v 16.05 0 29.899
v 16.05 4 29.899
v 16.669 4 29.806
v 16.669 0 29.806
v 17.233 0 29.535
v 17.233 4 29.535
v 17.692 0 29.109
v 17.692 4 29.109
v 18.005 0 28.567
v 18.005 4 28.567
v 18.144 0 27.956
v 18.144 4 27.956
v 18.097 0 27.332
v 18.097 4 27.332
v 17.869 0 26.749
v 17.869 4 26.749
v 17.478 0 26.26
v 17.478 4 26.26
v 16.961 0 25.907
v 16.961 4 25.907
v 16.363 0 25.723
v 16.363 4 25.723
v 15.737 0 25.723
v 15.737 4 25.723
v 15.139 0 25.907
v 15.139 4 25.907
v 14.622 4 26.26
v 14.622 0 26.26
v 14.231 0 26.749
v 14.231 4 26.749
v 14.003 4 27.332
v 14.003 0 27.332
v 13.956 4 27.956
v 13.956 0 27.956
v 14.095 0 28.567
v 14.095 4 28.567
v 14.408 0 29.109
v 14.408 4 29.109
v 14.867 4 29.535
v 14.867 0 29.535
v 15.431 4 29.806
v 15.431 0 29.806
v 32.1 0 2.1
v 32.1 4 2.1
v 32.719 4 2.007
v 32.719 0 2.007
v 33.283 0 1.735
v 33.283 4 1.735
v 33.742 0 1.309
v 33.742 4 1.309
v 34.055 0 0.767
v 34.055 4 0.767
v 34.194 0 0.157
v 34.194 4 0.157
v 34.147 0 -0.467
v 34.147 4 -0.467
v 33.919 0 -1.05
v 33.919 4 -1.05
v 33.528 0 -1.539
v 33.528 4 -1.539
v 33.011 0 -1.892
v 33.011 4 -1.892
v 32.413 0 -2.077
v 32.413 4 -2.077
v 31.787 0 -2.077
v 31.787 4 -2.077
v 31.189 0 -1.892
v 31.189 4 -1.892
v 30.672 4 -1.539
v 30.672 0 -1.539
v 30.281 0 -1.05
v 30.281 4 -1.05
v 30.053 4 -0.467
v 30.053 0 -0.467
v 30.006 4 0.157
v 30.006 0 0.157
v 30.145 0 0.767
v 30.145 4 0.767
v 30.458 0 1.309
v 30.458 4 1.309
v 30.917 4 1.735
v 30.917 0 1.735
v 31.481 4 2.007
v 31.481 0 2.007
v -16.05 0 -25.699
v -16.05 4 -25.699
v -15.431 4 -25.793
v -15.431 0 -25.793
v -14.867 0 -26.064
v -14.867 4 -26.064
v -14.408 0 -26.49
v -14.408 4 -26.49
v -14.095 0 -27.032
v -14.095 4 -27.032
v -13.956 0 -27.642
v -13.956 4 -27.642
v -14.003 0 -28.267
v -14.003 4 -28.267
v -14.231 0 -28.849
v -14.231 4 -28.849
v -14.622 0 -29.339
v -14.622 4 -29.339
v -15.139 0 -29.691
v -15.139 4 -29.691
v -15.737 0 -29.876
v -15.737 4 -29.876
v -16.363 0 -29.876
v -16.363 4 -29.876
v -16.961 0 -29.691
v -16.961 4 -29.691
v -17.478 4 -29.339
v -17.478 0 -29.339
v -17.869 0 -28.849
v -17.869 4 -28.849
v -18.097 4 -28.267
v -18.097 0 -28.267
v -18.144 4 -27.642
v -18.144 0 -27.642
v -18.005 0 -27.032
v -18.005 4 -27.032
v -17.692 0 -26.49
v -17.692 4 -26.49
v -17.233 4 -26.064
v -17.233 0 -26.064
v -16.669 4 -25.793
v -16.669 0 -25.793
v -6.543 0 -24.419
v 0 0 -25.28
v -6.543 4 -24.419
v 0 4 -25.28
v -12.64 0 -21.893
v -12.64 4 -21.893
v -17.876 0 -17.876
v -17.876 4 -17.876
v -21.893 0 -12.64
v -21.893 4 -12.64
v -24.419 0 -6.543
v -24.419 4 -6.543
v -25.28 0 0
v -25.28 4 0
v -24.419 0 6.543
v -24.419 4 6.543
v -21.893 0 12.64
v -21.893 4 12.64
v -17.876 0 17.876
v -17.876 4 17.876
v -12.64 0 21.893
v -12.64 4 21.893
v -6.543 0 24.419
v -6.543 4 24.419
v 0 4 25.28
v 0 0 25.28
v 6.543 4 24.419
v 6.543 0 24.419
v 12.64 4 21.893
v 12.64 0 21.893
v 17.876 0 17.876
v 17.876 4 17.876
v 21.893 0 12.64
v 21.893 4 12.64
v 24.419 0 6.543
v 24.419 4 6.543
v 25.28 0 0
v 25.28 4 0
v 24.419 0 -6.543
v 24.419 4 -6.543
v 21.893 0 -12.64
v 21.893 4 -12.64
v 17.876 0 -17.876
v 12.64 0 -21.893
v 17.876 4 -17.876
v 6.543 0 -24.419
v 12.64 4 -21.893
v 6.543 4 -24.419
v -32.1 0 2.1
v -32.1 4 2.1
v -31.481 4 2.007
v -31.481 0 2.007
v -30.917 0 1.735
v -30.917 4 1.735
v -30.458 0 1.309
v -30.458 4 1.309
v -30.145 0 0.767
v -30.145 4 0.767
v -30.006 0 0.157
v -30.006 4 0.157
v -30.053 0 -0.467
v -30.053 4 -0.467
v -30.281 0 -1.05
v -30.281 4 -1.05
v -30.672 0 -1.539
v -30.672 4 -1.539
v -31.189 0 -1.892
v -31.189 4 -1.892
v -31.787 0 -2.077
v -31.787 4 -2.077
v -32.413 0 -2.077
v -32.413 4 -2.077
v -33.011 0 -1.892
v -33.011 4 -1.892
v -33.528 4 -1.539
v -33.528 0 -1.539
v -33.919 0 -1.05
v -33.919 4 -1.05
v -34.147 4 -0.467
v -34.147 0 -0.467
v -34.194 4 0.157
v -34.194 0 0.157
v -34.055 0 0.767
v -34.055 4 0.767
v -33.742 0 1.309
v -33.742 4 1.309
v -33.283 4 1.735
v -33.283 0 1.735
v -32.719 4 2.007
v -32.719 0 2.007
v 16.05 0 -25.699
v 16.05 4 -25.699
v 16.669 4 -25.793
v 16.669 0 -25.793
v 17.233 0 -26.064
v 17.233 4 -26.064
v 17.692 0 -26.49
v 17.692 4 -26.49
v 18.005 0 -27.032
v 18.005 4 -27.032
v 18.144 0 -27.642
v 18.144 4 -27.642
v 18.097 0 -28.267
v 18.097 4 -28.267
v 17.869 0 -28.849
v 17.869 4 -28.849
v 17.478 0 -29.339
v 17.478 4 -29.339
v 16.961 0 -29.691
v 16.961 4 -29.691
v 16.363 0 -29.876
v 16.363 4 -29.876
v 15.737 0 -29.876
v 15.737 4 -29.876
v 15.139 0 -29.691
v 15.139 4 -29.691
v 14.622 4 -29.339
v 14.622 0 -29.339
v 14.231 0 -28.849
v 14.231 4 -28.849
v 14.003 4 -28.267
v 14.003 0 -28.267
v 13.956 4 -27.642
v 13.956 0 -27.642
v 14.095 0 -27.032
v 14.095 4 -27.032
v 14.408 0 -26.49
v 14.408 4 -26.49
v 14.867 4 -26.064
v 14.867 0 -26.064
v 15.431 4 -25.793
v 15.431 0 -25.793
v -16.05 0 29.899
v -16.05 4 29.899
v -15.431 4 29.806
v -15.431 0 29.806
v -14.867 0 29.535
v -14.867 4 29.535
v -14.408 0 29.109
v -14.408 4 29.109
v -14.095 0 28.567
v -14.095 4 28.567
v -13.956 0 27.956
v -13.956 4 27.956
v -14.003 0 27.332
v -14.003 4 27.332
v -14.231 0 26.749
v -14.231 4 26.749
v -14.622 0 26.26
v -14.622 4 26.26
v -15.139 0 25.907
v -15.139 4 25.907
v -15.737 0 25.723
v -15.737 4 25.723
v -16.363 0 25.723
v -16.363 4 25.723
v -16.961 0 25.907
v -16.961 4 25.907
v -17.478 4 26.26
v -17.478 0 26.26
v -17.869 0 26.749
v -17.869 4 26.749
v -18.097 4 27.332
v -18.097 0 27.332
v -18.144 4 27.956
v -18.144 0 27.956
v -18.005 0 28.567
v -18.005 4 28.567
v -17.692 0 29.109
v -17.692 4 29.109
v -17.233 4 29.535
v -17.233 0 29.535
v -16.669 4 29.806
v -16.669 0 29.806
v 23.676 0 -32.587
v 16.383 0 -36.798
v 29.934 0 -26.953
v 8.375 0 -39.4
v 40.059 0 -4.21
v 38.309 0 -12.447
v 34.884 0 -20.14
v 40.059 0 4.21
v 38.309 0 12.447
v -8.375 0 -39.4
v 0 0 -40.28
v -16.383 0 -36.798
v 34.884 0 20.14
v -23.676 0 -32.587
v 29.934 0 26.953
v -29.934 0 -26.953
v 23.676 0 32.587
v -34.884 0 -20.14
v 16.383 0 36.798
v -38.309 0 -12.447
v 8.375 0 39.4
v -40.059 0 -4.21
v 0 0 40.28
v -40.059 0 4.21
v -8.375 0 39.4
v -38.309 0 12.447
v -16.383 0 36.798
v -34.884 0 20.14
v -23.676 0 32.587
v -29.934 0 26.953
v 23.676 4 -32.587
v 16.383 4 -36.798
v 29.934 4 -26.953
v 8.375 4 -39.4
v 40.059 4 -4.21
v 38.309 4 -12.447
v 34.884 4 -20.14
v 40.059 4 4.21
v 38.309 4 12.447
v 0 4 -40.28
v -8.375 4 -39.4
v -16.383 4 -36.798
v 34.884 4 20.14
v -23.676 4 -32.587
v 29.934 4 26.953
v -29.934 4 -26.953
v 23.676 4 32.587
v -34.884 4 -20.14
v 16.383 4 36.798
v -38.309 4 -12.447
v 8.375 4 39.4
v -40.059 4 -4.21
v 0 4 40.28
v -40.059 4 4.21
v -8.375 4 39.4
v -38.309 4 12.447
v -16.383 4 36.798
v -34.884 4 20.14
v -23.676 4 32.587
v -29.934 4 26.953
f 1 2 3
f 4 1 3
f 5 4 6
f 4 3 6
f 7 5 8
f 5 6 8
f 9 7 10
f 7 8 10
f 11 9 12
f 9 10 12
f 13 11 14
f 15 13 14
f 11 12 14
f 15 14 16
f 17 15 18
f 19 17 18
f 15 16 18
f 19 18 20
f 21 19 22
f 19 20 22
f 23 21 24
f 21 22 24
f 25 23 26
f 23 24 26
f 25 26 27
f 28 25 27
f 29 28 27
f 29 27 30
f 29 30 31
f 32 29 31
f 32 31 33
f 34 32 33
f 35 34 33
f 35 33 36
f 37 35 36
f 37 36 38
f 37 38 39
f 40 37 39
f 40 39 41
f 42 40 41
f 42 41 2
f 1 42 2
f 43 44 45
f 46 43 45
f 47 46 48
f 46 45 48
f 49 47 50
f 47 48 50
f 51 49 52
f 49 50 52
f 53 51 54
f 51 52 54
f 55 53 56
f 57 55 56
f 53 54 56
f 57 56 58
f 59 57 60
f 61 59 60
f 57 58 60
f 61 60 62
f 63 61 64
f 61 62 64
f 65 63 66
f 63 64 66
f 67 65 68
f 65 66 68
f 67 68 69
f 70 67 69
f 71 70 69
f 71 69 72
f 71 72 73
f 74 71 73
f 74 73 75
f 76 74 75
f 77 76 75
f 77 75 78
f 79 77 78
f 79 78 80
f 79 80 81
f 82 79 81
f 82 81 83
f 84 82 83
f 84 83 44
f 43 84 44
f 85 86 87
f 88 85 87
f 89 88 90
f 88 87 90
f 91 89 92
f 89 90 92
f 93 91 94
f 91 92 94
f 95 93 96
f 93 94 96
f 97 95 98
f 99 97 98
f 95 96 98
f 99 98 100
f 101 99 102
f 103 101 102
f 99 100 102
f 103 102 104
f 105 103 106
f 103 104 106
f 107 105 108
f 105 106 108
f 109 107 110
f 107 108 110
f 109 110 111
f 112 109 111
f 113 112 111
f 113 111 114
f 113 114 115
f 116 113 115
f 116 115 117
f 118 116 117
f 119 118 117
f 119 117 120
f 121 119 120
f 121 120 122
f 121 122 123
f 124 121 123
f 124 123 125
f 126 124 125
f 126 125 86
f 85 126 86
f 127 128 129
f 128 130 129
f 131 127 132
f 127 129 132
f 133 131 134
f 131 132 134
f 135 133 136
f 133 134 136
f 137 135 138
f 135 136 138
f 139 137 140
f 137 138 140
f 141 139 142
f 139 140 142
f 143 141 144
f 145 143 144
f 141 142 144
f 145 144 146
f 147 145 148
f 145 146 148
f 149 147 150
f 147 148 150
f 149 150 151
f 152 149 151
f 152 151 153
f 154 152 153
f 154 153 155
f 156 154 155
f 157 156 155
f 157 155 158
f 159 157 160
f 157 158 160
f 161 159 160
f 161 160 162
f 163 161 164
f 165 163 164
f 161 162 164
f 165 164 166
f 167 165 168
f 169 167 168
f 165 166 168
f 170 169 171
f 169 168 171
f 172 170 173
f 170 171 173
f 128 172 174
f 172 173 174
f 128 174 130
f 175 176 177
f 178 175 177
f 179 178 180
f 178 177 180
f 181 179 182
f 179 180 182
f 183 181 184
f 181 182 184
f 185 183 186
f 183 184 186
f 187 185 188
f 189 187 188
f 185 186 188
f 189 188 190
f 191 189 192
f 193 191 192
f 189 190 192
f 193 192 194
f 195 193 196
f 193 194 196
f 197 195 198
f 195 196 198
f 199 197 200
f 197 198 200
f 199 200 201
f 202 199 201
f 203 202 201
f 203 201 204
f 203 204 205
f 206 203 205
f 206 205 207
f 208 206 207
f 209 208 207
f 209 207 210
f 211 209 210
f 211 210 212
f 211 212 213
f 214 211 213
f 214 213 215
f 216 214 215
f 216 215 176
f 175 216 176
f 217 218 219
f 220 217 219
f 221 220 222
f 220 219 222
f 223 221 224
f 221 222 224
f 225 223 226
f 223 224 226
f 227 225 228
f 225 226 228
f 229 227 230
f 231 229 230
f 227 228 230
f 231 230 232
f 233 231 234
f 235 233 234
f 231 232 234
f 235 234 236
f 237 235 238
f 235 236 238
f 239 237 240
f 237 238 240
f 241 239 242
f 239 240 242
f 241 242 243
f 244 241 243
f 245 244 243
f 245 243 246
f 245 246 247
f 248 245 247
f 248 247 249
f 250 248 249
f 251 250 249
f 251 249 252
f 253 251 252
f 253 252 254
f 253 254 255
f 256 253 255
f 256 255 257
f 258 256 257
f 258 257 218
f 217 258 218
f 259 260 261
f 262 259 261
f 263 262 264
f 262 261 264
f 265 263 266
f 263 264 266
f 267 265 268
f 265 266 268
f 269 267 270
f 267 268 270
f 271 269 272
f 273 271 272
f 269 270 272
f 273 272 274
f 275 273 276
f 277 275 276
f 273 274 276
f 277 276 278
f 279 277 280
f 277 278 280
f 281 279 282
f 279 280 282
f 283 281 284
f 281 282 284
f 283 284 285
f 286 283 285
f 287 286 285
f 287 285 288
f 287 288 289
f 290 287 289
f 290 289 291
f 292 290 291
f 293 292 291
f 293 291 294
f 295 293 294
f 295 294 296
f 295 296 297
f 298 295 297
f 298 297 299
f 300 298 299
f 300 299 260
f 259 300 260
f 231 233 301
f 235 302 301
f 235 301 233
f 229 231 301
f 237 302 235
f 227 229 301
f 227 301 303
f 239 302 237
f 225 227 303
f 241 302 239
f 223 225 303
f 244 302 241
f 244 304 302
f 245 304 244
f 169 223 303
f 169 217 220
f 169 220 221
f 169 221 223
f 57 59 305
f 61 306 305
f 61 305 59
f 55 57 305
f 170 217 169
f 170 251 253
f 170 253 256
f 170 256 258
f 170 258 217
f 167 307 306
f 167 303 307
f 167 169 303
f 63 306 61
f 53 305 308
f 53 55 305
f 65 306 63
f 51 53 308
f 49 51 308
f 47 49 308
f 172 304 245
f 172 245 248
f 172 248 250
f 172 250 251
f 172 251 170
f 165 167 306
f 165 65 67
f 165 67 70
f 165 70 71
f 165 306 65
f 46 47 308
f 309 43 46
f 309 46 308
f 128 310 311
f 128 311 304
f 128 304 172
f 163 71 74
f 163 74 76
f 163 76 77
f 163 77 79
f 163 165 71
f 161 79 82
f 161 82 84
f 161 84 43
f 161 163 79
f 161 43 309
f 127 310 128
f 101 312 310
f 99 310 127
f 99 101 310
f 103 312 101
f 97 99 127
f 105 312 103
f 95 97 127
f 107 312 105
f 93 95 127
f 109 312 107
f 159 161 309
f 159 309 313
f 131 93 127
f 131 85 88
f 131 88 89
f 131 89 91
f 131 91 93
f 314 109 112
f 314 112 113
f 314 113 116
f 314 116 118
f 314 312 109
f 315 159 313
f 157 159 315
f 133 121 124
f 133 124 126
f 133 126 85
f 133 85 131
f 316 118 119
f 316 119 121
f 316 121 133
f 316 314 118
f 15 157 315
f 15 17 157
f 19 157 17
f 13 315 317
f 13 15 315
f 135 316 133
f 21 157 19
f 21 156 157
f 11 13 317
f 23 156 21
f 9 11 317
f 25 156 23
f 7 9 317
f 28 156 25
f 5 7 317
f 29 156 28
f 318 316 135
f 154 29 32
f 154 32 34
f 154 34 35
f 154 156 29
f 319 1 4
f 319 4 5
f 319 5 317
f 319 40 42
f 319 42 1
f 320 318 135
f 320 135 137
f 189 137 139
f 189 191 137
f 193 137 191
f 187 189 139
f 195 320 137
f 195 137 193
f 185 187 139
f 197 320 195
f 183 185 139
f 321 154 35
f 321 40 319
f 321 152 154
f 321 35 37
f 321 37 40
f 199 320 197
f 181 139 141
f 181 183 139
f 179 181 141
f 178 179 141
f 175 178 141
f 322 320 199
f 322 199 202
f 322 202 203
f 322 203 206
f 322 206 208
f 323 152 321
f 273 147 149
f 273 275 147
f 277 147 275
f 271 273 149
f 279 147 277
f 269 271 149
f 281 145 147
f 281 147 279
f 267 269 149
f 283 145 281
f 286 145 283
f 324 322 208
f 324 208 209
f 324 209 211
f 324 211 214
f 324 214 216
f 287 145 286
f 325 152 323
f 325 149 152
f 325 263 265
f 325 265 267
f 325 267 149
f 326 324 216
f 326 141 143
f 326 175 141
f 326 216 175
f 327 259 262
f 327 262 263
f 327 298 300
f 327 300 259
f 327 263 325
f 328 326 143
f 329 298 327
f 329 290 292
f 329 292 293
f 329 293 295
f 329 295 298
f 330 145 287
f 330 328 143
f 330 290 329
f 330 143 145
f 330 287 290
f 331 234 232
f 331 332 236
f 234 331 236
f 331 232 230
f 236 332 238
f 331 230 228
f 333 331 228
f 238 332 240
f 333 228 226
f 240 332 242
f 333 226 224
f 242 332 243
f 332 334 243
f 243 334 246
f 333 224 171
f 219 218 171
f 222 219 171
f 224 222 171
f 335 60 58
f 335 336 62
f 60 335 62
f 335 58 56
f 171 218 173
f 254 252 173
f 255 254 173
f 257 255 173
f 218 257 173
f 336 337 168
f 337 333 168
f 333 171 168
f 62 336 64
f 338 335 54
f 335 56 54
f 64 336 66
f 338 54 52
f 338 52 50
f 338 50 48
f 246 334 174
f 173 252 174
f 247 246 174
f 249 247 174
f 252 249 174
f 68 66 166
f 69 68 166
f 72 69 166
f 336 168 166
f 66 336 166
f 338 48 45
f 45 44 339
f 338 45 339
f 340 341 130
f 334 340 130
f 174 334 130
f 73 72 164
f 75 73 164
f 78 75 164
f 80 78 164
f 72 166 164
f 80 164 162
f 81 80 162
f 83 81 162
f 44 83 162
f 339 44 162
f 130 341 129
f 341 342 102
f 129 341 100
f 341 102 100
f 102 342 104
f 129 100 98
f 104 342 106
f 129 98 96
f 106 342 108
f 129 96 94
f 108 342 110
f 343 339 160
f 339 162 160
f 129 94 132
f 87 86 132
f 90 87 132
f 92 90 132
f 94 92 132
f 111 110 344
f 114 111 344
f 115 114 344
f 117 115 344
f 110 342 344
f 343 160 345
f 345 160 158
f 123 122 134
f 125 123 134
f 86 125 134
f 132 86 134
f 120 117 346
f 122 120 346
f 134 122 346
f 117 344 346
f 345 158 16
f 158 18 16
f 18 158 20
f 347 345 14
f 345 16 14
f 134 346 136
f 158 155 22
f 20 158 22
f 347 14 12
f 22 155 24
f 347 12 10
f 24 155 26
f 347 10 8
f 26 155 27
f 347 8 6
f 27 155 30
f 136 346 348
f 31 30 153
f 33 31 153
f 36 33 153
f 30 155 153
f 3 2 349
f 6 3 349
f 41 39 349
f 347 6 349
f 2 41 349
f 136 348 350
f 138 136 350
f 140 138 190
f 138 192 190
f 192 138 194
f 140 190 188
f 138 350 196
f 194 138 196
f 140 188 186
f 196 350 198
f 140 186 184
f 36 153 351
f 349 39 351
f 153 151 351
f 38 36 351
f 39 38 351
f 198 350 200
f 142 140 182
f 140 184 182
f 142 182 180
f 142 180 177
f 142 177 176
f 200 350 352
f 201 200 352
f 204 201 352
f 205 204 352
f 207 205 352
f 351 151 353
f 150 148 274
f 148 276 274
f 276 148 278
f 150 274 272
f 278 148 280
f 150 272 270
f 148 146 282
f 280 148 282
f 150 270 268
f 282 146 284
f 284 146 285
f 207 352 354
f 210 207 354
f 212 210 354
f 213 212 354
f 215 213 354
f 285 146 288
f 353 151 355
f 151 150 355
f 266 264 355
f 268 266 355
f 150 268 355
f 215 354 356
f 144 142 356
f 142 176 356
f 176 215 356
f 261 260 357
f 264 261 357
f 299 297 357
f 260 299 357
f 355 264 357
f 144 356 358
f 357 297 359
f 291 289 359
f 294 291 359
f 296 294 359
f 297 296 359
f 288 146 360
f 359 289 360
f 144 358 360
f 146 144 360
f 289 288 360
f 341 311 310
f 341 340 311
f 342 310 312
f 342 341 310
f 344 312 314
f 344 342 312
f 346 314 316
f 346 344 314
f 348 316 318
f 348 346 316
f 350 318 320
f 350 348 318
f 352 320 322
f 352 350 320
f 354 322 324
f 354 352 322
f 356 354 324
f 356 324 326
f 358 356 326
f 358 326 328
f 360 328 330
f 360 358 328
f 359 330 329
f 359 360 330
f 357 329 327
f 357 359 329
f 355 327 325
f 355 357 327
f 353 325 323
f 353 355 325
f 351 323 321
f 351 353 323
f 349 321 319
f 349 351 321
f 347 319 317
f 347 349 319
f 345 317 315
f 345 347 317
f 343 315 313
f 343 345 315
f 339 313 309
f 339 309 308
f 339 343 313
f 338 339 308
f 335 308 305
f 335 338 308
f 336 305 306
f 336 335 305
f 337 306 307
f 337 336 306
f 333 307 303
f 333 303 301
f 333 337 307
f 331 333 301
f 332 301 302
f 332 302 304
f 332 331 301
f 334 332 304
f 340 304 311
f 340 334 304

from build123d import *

# Parameters (mm, degrees)
SKETCH_1_W          = 15
SKETCH_1_H          = 4
SKETCH_2_R          = 2.1
CUT_EXTRUDE_1_DEPTH = 10


with BuildPart() as part:
    # 草图1 → 旋转1 (revolve)
    with BuildSketch(Plane.XY, mode=Mode.PRIVATE) as revolve_1_sk:
        with Locations((32.78, 2)):
            Rectangle(SKETCH_1_W, SKETCH_1_H)
    revolve(revolve_1_sk.sketch.rotate(Axis((0, 0, 0), (0, 1, 0)), 90), axis=Axis((0, 0, 0), (0, 1, 0)))

    # 草图2 → 切除-拉伸1 (cut)
    with BuildSketch(Plane(origin=(0, 4, 0), x_dir=(1, 0, 0), z_dir=(0, 1, 0))):
        with Locations(Location((-32.1, 0, 0), (0, 0, 270))):
            Circle(SKETCH_2_R)
        with Locations(Location((-16.05, 27.799415461, 0), (0, 0, 270))):
            Circle(SKETCH_2_R)
        with Locations(Location((16.05, 27.799415461, 0), (0, 0, 270))):
            Circle(SKETCH_2_R)
        with Locations(Location((32.1, 0, 0), (0, 0, 270))):
            Circle(SKETCH_2_R)
        with Locations(Location((16.05, -27.799415461, 0), (0, 0, 270))):
            Circle(SKETCH_2_R)
        with Locations(Location((-16.05, -27.799415461, 0), (0, 0, 270))):
            Circle(SKETCH_2_R)
    extrude(amount=-CUT_EXTRUDE_1_DEPTH, mode=Mode.SUBTRACT)


solid = part.part
